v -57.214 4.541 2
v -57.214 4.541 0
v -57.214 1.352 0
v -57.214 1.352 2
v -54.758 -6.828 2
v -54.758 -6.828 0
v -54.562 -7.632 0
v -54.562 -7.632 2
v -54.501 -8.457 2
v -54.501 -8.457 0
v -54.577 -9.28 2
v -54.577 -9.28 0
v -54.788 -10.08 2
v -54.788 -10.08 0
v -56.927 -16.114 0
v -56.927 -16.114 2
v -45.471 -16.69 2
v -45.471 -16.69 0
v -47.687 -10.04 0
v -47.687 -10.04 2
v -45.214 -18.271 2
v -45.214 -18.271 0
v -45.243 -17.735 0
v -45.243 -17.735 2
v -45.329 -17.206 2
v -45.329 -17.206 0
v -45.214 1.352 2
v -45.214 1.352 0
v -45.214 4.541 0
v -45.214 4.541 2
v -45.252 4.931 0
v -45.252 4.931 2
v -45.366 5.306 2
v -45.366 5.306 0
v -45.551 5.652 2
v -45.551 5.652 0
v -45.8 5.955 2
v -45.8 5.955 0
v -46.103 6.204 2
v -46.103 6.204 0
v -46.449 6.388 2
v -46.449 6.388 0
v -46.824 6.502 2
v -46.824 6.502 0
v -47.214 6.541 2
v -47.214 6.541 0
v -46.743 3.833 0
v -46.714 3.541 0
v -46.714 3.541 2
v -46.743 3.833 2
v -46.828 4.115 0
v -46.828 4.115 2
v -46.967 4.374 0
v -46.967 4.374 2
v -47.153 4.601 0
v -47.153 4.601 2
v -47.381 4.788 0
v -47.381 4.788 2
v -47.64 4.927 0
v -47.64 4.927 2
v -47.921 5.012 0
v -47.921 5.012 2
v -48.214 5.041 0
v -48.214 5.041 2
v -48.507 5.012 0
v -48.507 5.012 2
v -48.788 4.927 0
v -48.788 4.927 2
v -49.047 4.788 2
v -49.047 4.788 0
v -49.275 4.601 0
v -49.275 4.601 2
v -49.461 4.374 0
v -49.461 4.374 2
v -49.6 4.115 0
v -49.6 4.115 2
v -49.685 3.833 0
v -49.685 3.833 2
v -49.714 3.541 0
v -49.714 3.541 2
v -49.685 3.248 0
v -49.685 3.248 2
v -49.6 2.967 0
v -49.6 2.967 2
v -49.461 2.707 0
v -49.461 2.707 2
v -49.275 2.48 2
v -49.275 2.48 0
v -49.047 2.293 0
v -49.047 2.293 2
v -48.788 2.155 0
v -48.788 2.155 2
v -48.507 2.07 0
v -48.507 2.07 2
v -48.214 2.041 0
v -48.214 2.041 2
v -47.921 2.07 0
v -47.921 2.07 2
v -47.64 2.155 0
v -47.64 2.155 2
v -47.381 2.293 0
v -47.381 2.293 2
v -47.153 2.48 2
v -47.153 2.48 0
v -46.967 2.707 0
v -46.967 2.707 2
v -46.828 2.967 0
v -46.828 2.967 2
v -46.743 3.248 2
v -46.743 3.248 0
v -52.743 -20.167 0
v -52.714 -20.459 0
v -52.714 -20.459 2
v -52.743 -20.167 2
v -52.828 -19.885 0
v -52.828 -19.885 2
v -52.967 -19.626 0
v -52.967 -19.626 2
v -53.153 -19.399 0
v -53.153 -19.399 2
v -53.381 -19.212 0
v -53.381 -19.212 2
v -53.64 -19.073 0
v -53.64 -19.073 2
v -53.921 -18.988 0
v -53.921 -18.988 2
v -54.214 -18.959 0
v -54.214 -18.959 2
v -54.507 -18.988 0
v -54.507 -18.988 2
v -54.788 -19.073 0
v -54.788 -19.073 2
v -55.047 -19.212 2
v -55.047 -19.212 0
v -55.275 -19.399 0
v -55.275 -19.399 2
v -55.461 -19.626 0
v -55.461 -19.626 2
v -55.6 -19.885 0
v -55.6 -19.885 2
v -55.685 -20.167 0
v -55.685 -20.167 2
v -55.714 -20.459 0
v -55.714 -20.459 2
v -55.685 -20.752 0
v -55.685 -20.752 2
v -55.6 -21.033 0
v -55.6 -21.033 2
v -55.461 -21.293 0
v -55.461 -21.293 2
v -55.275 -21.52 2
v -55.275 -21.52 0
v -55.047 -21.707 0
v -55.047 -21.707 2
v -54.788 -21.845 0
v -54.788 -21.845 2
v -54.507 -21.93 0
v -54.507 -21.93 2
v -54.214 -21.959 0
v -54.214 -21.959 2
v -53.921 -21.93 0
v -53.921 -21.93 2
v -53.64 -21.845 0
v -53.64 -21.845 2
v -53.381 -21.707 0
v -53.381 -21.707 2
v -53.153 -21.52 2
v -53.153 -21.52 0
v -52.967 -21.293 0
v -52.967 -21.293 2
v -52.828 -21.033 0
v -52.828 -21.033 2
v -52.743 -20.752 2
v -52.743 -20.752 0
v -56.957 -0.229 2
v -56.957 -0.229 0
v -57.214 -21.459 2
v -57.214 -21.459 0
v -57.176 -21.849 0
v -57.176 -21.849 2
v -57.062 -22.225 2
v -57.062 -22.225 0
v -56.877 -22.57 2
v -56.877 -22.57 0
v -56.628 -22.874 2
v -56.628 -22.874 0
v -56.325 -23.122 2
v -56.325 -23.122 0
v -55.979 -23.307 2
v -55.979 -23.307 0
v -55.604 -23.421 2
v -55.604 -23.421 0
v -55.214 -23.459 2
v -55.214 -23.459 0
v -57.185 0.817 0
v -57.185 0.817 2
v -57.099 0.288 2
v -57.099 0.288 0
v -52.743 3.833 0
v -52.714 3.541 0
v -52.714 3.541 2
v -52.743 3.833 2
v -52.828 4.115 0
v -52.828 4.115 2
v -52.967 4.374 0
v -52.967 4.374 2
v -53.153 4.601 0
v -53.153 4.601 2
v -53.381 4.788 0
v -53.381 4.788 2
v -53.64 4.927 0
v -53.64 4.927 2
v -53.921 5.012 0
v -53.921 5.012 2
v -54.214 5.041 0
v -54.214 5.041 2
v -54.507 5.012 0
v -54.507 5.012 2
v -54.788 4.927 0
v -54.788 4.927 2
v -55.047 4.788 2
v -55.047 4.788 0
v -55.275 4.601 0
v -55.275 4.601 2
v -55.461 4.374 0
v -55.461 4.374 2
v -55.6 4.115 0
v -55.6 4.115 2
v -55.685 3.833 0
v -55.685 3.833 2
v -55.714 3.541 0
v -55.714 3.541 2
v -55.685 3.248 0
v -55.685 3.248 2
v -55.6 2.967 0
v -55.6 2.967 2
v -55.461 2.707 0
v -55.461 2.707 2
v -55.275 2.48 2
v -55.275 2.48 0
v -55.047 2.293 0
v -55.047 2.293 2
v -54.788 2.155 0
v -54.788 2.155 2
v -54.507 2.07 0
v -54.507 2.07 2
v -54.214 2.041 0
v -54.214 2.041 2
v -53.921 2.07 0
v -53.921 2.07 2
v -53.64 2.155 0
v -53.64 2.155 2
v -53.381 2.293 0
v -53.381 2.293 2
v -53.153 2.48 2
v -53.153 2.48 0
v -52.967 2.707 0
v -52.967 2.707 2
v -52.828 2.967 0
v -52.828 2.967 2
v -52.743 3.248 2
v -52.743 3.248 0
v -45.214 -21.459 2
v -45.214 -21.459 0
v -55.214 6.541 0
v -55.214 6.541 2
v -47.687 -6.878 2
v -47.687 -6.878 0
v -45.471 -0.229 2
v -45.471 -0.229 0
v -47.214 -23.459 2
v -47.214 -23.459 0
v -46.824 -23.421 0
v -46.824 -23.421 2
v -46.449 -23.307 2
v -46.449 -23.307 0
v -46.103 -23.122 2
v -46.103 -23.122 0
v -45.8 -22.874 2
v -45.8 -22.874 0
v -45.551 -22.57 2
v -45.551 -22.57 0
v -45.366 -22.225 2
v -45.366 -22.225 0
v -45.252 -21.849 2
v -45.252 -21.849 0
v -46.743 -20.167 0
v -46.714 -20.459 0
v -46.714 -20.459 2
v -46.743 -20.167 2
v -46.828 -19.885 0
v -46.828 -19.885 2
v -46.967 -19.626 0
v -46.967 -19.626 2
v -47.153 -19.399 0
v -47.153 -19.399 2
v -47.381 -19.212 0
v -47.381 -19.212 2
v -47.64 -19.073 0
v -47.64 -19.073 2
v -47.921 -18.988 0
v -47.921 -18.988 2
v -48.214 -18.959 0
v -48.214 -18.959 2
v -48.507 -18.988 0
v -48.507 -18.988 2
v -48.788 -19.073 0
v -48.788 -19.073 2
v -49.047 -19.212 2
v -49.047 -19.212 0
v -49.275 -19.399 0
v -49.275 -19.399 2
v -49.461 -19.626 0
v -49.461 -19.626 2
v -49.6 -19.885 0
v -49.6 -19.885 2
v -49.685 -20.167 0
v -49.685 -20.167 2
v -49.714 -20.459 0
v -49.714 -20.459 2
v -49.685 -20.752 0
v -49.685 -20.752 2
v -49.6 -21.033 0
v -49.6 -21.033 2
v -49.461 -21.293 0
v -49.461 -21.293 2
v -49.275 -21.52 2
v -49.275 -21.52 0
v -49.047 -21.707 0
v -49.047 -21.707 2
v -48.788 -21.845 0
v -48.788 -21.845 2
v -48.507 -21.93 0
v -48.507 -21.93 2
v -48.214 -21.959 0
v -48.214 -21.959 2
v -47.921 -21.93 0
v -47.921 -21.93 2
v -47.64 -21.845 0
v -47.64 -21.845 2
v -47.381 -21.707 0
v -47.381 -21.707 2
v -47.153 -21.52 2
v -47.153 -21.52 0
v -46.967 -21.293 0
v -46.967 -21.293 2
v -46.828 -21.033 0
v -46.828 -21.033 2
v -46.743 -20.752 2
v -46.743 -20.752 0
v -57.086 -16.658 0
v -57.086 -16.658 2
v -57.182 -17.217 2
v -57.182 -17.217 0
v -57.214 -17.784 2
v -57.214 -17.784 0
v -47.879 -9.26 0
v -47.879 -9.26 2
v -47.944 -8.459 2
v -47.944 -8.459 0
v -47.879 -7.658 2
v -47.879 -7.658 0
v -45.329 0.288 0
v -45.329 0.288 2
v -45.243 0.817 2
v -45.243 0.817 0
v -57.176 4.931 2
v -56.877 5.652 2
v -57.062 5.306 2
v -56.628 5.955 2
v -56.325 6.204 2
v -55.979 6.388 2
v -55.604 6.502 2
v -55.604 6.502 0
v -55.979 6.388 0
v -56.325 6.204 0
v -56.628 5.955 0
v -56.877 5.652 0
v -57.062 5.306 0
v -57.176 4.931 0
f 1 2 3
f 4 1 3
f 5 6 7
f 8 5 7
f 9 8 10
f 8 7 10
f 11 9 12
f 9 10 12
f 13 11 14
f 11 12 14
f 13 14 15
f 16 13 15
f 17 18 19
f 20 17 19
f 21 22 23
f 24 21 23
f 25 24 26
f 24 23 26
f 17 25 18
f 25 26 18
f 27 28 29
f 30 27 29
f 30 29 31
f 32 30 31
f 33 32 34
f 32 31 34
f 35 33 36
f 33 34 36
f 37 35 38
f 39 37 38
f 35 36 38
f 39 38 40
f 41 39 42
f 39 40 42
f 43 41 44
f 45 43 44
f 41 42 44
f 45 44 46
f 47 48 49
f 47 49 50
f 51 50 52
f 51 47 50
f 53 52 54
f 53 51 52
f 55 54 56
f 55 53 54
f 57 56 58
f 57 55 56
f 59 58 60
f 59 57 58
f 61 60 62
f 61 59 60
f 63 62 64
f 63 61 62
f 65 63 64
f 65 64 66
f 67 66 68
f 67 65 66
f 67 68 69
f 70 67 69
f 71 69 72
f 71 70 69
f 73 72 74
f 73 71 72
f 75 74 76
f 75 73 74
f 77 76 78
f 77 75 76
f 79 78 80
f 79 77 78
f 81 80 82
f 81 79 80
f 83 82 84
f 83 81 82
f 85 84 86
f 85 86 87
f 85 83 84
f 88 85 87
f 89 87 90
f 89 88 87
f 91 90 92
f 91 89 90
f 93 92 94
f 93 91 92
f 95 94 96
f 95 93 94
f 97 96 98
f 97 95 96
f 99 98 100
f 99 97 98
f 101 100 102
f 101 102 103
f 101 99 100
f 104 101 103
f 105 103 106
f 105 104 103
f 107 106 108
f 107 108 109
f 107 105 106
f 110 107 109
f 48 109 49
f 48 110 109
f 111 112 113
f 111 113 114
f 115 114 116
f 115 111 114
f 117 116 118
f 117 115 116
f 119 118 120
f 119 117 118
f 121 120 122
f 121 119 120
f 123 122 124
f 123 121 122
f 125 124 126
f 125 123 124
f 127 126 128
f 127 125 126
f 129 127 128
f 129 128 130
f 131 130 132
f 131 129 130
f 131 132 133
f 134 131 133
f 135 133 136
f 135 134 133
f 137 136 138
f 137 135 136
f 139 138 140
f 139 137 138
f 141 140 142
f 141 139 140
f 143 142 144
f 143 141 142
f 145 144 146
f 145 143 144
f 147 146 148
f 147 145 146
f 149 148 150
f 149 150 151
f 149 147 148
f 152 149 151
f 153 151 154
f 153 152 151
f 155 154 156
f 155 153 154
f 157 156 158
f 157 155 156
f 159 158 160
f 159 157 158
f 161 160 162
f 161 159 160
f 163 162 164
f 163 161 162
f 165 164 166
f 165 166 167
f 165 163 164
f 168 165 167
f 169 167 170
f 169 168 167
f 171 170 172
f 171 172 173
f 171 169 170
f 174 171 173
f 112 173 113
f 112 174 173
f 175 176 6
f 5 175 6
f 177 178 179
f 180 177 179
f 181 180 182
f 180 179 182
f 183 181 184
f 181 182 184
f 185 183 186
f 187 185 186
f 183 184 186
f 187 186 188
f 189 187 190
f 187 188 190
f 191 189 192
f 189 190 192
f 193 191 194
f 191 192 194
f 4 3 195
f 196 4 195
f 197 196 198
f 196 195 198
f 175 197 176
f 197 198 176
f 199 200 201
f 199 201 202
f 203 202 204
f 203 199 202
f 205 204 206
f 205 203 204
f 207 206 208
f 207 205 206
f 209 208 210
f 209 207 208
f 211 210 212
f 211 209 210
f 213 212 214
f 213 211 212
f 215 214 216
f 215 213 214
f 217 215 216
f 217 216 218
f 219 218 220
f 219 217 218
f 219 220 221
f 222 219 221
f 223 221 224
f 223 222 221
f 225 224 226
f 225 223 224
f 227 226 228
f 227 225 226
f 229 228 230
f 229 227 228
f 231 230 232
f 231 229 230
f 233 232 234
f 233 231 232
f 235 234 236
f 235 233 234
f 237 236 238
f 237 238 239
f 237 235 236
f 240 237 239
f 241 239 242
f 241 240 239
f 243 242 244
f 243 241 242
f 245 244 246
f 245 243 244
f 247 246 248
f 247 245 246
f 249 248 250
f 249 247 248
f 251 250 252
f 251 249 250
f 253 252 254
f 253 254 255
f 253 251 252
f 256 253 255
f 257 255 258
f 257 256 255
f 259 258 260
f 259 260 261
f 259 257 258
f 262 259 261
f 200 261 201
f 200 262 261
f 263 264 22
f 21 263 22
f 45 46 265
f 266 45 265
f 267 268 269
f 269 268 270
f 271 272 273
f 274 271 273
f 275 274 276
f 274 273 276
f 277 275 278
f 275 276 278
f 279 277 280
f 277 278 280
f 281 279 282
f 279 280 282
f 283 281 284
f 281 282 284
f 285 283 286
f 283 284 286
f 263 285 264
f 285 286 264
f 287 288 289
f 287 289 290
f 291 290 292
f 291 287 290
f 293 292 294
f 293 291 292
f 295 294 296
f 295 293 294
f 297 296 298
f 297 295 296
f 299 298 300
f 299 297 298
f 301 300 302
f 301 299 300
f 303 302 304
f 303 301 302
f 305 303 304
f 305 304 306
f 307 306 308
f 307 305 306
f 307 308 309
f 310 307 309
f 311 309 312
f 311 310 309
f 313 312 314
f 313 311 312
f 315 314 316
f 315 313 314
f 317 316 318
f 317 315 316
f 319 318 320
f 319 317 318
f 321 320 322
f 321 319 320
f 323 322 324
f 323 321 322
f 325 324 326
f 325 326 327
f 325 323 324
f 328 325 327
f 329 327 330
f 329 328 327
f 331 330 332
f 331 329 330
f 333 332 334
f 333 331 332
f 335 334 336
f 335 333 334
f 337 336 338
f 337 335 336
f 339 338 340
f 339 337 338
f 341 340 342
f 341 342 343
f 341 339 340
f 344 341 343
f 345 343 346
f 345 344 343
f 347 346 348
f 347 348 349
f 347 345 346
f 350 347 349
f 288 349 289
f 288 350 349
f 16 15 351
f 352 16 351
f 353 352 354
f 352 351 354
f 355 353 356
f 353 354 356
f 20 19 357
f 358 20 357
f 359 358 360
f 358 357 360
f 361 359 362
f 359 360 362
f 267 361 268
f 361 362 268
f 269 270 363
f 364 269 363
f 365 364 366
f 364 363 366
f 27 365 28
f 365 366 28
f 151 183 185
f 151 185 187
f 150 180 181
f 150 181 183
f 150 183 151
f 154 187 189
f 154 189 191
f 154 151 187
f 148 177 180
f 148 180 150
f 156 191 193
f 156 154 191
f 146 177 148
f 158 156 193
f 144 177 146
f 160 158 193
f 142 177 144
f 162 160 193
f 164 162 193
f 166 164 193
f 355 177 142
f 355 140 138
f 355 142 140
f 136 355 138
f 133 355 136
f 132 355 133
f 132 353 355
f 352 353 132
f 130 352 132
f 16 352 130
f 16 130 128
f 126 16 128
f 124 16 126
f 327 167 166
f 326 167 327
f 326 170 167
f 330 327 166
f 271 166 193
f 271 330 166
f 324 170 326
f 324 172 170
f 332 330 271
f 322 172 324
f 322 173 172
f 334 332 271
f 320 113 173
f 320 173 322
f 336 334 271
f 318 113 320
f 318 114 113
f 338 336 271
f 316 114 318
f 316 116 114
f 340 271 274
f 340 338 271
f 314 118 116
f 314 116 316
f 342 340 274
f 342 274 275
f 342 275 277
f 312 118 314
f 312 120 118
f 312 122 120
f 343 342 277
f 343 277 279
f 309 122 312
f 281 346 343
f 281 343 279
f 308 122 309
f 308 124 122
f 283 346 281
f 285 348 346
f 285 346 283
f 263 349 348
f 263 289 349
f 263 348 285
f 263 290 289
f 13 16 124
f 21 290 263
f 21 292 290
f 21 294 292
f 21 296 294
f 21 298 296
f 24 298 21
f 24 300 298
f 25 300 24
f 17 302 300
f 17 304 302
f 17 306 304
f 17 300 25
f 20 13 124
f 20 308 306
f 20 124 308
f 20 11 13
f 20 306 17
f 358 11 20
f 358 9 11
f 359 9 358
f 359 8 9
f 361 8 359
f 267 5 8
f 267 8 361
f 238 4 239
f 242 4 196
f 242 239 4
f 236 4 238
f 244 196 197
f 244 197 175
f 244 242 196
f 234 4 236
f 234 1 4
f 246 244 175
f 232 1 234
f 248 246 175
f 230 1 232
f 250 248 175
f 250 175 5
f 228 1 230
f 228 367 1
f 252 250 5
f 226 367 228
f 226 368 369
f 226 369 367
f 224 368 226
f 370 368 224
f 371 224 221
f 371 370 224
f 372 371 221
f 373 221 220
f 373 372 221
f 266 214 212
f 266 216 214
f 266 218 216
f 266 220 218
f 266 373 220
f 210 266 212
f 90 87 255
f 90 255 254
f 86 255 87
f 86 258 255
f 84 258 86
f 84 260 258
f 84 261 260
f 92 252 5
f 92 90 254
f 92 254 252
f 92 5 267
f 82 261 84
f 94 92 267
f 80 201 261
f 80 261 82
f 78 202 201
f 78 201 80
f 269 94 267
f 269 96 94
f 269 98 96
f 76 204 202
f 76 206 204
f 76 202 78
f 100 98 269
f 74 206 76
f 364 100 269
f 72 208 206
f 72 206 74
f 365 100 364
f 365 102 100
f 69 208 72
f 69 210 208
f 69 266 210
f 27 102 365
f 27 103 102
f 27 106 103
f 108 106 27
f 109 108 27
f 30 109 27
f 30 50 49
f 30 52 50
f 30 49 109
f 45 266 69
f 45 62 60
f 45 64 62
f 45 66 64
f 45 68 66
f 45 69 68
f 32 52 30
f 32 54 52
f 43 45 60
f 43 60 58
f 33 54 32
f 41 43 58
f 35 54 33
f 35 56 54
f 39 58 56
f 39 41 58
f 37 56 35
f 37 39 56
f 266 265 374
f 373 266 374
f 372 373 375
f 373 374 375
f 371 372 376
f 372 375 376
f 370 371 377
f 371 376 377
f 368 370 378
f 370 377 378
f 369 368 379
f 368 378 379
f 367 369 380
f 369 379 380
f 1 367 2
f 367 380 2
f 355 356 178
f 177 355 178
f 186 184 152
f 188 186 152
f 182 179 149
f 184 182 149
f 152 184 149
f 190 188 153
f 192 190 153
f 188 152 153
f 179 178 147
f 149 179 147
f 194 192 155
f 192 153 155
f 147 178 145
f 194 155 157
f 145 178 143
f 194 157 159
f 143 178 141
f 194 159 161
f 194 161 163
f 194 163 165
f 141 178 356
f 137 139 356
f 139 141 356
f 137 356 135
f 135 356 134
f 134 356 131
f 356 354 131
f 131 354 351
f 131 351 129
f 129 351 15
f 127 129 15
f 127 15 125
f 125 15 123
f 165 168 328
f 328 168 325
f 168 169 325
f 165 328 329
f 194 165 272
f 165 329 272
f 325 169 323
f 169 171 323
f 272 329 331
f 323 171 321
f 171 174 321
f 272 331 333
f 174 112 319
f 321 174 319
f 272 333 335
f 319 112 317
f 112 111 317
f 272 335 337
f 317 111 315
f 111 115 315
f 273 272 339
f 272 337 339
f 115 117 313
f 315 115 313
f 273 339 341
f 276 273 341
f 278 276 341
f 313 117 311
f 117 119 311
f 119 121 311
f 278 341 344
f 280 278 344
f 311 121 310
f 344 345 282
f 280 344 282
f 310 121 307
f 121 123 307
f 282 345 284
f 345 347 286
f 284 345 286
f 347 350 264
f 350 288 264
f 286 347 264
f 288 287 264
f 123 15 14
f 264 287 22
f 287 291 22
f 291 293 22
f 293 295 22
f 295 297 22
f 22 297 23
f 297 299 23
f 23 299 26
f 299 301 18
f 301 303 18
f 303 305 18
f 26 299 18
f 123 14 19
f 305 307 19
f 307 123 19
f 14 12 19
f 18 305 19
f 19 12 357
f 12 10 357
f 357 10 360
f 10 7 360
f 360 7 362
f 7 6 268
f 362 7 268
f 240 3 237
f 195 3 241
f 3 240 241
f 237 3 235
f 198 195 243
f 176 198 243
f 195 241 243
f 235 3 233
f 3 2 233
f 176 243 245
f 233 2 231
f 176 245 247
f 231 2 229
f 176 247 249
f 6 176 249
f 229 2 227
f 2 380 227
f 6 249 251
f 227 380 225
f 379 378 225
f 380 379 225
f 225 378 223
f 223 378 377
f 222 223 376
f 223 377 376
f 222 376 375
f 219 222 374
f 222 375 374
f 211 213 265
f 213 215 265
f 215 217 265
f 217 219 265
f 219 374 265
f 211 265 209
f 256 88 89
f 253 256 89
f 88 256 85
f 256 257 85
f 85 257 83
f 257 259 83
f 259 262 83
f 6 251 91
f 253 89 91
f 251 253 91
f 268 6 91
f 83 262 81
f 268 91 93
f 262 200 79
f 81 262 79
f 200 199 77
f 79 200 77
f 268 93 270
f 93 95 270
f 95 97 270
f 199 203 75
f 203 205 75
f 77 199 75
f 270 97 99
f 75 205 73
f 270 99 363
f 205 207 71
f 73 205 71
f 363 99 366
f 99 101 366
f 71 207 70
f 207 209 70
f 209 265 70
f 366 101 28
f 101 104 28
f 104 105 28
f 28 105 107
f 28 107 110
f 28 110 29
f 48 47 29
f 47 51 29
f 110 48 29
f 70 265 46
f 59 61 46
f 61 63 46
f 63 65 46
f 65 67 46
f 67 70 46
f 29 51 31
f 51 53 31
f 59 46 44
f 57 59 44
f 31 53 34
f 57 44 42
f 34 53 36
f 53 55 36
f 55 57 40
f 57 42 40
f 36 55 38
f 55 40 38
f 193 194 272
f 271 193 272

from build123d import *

# Parameters (mm, degrees)
F0_R     = 1.5
F1_DEPTH = 2


with BuildPart() as f1:
    # F0 (on Top) → F1 (new body)
    with BuildSketch(Plane.XY):
        with BuildLine():
            ThreePointArc((-57.214044, -21.459296), (-56.628257, -22.87351), (-55.214044, -23.459296))
            Line((-55.214044, -23.459296), (-47.214044, -23.459296))
            ThreePointArc((-47.214044, -23.459296), (-45.79983, -22.87351), (-45.214044, -21.459296))
            Line((-45.214044, -21.459296), (-45.214044, -18.270684))
            ThreePointArc((-45.214044, -18.270684), (-45.278606, -17.469773), (-45.470627, -16.689545))
            Line((-45.470627, -16.689545), (-47.686997, -10.040435))
            ThreePointArc((-47.686997, -10.040435), (-47.943581, -8.459296), (-47.686997, -6.878157))
            Line((-47.686997, -6.878157), (-45.470627, -0.229047))
            ThreePointArc((-45.470627, -0.229047), (-45.278606, 0.551181), (-45.214044, 1.352092))
            Line((-45.214044, 1.352092), (-45.214044, 4.540704))
            ThreePointArc((-45.214044, 4.540704), (-45.79983, 5.954918), (-47.214044, 6.540704))
            Line((-47.214044, 6.540704), (-55.214044, 6.540704))
            ThreePointArc((-55.214044, 6.540704), (-56.628257, 5.954918), (-57.214044, 4.540704))
            Line((-57.214044, 4.540704), (-57.214044, 1.352092))
            ThreePointArc((-57.214044, 1.352092), (-57.149481, 0.551181), (-56.95746, -0.229047))
            Line((-56.95746, -0.229047), (-54.7577, -6.828327))
            ThreePointArc((-54.7577, -6.828327), (-54.501338, -8.456588), (-54.788344, -10.079728))
            Line((-54.788344, -10.079728), (-56.926816, -16.113589))
            ThreePointArc((-56.926816, -16.113589), (-57.141713, -16.936462), (-57.214044, -17.783851))
            Line((-57.214044, -17.783851), (-57.214044, -21.459296))
        make_face()
        with Locations((-54.214044, -20.459296)):
            Circle(F0_R, mode=Mode.SUBTRACT)
        with Locations((-48.214044, -20.459296)):
            Circle(F0_R, mode=Mode.SUBTRACT)
        with Locations((-54.214044, 3.540704)):
            Circle(F0_R, mode=Mode.SUBTRACT)
        with Locations((-48.214044, 3.540704)):
            Circle(F0_R, mode=Mode.SUBTRACT)
    extrude(amount=F1_DEPTH)


solid = f1.part
